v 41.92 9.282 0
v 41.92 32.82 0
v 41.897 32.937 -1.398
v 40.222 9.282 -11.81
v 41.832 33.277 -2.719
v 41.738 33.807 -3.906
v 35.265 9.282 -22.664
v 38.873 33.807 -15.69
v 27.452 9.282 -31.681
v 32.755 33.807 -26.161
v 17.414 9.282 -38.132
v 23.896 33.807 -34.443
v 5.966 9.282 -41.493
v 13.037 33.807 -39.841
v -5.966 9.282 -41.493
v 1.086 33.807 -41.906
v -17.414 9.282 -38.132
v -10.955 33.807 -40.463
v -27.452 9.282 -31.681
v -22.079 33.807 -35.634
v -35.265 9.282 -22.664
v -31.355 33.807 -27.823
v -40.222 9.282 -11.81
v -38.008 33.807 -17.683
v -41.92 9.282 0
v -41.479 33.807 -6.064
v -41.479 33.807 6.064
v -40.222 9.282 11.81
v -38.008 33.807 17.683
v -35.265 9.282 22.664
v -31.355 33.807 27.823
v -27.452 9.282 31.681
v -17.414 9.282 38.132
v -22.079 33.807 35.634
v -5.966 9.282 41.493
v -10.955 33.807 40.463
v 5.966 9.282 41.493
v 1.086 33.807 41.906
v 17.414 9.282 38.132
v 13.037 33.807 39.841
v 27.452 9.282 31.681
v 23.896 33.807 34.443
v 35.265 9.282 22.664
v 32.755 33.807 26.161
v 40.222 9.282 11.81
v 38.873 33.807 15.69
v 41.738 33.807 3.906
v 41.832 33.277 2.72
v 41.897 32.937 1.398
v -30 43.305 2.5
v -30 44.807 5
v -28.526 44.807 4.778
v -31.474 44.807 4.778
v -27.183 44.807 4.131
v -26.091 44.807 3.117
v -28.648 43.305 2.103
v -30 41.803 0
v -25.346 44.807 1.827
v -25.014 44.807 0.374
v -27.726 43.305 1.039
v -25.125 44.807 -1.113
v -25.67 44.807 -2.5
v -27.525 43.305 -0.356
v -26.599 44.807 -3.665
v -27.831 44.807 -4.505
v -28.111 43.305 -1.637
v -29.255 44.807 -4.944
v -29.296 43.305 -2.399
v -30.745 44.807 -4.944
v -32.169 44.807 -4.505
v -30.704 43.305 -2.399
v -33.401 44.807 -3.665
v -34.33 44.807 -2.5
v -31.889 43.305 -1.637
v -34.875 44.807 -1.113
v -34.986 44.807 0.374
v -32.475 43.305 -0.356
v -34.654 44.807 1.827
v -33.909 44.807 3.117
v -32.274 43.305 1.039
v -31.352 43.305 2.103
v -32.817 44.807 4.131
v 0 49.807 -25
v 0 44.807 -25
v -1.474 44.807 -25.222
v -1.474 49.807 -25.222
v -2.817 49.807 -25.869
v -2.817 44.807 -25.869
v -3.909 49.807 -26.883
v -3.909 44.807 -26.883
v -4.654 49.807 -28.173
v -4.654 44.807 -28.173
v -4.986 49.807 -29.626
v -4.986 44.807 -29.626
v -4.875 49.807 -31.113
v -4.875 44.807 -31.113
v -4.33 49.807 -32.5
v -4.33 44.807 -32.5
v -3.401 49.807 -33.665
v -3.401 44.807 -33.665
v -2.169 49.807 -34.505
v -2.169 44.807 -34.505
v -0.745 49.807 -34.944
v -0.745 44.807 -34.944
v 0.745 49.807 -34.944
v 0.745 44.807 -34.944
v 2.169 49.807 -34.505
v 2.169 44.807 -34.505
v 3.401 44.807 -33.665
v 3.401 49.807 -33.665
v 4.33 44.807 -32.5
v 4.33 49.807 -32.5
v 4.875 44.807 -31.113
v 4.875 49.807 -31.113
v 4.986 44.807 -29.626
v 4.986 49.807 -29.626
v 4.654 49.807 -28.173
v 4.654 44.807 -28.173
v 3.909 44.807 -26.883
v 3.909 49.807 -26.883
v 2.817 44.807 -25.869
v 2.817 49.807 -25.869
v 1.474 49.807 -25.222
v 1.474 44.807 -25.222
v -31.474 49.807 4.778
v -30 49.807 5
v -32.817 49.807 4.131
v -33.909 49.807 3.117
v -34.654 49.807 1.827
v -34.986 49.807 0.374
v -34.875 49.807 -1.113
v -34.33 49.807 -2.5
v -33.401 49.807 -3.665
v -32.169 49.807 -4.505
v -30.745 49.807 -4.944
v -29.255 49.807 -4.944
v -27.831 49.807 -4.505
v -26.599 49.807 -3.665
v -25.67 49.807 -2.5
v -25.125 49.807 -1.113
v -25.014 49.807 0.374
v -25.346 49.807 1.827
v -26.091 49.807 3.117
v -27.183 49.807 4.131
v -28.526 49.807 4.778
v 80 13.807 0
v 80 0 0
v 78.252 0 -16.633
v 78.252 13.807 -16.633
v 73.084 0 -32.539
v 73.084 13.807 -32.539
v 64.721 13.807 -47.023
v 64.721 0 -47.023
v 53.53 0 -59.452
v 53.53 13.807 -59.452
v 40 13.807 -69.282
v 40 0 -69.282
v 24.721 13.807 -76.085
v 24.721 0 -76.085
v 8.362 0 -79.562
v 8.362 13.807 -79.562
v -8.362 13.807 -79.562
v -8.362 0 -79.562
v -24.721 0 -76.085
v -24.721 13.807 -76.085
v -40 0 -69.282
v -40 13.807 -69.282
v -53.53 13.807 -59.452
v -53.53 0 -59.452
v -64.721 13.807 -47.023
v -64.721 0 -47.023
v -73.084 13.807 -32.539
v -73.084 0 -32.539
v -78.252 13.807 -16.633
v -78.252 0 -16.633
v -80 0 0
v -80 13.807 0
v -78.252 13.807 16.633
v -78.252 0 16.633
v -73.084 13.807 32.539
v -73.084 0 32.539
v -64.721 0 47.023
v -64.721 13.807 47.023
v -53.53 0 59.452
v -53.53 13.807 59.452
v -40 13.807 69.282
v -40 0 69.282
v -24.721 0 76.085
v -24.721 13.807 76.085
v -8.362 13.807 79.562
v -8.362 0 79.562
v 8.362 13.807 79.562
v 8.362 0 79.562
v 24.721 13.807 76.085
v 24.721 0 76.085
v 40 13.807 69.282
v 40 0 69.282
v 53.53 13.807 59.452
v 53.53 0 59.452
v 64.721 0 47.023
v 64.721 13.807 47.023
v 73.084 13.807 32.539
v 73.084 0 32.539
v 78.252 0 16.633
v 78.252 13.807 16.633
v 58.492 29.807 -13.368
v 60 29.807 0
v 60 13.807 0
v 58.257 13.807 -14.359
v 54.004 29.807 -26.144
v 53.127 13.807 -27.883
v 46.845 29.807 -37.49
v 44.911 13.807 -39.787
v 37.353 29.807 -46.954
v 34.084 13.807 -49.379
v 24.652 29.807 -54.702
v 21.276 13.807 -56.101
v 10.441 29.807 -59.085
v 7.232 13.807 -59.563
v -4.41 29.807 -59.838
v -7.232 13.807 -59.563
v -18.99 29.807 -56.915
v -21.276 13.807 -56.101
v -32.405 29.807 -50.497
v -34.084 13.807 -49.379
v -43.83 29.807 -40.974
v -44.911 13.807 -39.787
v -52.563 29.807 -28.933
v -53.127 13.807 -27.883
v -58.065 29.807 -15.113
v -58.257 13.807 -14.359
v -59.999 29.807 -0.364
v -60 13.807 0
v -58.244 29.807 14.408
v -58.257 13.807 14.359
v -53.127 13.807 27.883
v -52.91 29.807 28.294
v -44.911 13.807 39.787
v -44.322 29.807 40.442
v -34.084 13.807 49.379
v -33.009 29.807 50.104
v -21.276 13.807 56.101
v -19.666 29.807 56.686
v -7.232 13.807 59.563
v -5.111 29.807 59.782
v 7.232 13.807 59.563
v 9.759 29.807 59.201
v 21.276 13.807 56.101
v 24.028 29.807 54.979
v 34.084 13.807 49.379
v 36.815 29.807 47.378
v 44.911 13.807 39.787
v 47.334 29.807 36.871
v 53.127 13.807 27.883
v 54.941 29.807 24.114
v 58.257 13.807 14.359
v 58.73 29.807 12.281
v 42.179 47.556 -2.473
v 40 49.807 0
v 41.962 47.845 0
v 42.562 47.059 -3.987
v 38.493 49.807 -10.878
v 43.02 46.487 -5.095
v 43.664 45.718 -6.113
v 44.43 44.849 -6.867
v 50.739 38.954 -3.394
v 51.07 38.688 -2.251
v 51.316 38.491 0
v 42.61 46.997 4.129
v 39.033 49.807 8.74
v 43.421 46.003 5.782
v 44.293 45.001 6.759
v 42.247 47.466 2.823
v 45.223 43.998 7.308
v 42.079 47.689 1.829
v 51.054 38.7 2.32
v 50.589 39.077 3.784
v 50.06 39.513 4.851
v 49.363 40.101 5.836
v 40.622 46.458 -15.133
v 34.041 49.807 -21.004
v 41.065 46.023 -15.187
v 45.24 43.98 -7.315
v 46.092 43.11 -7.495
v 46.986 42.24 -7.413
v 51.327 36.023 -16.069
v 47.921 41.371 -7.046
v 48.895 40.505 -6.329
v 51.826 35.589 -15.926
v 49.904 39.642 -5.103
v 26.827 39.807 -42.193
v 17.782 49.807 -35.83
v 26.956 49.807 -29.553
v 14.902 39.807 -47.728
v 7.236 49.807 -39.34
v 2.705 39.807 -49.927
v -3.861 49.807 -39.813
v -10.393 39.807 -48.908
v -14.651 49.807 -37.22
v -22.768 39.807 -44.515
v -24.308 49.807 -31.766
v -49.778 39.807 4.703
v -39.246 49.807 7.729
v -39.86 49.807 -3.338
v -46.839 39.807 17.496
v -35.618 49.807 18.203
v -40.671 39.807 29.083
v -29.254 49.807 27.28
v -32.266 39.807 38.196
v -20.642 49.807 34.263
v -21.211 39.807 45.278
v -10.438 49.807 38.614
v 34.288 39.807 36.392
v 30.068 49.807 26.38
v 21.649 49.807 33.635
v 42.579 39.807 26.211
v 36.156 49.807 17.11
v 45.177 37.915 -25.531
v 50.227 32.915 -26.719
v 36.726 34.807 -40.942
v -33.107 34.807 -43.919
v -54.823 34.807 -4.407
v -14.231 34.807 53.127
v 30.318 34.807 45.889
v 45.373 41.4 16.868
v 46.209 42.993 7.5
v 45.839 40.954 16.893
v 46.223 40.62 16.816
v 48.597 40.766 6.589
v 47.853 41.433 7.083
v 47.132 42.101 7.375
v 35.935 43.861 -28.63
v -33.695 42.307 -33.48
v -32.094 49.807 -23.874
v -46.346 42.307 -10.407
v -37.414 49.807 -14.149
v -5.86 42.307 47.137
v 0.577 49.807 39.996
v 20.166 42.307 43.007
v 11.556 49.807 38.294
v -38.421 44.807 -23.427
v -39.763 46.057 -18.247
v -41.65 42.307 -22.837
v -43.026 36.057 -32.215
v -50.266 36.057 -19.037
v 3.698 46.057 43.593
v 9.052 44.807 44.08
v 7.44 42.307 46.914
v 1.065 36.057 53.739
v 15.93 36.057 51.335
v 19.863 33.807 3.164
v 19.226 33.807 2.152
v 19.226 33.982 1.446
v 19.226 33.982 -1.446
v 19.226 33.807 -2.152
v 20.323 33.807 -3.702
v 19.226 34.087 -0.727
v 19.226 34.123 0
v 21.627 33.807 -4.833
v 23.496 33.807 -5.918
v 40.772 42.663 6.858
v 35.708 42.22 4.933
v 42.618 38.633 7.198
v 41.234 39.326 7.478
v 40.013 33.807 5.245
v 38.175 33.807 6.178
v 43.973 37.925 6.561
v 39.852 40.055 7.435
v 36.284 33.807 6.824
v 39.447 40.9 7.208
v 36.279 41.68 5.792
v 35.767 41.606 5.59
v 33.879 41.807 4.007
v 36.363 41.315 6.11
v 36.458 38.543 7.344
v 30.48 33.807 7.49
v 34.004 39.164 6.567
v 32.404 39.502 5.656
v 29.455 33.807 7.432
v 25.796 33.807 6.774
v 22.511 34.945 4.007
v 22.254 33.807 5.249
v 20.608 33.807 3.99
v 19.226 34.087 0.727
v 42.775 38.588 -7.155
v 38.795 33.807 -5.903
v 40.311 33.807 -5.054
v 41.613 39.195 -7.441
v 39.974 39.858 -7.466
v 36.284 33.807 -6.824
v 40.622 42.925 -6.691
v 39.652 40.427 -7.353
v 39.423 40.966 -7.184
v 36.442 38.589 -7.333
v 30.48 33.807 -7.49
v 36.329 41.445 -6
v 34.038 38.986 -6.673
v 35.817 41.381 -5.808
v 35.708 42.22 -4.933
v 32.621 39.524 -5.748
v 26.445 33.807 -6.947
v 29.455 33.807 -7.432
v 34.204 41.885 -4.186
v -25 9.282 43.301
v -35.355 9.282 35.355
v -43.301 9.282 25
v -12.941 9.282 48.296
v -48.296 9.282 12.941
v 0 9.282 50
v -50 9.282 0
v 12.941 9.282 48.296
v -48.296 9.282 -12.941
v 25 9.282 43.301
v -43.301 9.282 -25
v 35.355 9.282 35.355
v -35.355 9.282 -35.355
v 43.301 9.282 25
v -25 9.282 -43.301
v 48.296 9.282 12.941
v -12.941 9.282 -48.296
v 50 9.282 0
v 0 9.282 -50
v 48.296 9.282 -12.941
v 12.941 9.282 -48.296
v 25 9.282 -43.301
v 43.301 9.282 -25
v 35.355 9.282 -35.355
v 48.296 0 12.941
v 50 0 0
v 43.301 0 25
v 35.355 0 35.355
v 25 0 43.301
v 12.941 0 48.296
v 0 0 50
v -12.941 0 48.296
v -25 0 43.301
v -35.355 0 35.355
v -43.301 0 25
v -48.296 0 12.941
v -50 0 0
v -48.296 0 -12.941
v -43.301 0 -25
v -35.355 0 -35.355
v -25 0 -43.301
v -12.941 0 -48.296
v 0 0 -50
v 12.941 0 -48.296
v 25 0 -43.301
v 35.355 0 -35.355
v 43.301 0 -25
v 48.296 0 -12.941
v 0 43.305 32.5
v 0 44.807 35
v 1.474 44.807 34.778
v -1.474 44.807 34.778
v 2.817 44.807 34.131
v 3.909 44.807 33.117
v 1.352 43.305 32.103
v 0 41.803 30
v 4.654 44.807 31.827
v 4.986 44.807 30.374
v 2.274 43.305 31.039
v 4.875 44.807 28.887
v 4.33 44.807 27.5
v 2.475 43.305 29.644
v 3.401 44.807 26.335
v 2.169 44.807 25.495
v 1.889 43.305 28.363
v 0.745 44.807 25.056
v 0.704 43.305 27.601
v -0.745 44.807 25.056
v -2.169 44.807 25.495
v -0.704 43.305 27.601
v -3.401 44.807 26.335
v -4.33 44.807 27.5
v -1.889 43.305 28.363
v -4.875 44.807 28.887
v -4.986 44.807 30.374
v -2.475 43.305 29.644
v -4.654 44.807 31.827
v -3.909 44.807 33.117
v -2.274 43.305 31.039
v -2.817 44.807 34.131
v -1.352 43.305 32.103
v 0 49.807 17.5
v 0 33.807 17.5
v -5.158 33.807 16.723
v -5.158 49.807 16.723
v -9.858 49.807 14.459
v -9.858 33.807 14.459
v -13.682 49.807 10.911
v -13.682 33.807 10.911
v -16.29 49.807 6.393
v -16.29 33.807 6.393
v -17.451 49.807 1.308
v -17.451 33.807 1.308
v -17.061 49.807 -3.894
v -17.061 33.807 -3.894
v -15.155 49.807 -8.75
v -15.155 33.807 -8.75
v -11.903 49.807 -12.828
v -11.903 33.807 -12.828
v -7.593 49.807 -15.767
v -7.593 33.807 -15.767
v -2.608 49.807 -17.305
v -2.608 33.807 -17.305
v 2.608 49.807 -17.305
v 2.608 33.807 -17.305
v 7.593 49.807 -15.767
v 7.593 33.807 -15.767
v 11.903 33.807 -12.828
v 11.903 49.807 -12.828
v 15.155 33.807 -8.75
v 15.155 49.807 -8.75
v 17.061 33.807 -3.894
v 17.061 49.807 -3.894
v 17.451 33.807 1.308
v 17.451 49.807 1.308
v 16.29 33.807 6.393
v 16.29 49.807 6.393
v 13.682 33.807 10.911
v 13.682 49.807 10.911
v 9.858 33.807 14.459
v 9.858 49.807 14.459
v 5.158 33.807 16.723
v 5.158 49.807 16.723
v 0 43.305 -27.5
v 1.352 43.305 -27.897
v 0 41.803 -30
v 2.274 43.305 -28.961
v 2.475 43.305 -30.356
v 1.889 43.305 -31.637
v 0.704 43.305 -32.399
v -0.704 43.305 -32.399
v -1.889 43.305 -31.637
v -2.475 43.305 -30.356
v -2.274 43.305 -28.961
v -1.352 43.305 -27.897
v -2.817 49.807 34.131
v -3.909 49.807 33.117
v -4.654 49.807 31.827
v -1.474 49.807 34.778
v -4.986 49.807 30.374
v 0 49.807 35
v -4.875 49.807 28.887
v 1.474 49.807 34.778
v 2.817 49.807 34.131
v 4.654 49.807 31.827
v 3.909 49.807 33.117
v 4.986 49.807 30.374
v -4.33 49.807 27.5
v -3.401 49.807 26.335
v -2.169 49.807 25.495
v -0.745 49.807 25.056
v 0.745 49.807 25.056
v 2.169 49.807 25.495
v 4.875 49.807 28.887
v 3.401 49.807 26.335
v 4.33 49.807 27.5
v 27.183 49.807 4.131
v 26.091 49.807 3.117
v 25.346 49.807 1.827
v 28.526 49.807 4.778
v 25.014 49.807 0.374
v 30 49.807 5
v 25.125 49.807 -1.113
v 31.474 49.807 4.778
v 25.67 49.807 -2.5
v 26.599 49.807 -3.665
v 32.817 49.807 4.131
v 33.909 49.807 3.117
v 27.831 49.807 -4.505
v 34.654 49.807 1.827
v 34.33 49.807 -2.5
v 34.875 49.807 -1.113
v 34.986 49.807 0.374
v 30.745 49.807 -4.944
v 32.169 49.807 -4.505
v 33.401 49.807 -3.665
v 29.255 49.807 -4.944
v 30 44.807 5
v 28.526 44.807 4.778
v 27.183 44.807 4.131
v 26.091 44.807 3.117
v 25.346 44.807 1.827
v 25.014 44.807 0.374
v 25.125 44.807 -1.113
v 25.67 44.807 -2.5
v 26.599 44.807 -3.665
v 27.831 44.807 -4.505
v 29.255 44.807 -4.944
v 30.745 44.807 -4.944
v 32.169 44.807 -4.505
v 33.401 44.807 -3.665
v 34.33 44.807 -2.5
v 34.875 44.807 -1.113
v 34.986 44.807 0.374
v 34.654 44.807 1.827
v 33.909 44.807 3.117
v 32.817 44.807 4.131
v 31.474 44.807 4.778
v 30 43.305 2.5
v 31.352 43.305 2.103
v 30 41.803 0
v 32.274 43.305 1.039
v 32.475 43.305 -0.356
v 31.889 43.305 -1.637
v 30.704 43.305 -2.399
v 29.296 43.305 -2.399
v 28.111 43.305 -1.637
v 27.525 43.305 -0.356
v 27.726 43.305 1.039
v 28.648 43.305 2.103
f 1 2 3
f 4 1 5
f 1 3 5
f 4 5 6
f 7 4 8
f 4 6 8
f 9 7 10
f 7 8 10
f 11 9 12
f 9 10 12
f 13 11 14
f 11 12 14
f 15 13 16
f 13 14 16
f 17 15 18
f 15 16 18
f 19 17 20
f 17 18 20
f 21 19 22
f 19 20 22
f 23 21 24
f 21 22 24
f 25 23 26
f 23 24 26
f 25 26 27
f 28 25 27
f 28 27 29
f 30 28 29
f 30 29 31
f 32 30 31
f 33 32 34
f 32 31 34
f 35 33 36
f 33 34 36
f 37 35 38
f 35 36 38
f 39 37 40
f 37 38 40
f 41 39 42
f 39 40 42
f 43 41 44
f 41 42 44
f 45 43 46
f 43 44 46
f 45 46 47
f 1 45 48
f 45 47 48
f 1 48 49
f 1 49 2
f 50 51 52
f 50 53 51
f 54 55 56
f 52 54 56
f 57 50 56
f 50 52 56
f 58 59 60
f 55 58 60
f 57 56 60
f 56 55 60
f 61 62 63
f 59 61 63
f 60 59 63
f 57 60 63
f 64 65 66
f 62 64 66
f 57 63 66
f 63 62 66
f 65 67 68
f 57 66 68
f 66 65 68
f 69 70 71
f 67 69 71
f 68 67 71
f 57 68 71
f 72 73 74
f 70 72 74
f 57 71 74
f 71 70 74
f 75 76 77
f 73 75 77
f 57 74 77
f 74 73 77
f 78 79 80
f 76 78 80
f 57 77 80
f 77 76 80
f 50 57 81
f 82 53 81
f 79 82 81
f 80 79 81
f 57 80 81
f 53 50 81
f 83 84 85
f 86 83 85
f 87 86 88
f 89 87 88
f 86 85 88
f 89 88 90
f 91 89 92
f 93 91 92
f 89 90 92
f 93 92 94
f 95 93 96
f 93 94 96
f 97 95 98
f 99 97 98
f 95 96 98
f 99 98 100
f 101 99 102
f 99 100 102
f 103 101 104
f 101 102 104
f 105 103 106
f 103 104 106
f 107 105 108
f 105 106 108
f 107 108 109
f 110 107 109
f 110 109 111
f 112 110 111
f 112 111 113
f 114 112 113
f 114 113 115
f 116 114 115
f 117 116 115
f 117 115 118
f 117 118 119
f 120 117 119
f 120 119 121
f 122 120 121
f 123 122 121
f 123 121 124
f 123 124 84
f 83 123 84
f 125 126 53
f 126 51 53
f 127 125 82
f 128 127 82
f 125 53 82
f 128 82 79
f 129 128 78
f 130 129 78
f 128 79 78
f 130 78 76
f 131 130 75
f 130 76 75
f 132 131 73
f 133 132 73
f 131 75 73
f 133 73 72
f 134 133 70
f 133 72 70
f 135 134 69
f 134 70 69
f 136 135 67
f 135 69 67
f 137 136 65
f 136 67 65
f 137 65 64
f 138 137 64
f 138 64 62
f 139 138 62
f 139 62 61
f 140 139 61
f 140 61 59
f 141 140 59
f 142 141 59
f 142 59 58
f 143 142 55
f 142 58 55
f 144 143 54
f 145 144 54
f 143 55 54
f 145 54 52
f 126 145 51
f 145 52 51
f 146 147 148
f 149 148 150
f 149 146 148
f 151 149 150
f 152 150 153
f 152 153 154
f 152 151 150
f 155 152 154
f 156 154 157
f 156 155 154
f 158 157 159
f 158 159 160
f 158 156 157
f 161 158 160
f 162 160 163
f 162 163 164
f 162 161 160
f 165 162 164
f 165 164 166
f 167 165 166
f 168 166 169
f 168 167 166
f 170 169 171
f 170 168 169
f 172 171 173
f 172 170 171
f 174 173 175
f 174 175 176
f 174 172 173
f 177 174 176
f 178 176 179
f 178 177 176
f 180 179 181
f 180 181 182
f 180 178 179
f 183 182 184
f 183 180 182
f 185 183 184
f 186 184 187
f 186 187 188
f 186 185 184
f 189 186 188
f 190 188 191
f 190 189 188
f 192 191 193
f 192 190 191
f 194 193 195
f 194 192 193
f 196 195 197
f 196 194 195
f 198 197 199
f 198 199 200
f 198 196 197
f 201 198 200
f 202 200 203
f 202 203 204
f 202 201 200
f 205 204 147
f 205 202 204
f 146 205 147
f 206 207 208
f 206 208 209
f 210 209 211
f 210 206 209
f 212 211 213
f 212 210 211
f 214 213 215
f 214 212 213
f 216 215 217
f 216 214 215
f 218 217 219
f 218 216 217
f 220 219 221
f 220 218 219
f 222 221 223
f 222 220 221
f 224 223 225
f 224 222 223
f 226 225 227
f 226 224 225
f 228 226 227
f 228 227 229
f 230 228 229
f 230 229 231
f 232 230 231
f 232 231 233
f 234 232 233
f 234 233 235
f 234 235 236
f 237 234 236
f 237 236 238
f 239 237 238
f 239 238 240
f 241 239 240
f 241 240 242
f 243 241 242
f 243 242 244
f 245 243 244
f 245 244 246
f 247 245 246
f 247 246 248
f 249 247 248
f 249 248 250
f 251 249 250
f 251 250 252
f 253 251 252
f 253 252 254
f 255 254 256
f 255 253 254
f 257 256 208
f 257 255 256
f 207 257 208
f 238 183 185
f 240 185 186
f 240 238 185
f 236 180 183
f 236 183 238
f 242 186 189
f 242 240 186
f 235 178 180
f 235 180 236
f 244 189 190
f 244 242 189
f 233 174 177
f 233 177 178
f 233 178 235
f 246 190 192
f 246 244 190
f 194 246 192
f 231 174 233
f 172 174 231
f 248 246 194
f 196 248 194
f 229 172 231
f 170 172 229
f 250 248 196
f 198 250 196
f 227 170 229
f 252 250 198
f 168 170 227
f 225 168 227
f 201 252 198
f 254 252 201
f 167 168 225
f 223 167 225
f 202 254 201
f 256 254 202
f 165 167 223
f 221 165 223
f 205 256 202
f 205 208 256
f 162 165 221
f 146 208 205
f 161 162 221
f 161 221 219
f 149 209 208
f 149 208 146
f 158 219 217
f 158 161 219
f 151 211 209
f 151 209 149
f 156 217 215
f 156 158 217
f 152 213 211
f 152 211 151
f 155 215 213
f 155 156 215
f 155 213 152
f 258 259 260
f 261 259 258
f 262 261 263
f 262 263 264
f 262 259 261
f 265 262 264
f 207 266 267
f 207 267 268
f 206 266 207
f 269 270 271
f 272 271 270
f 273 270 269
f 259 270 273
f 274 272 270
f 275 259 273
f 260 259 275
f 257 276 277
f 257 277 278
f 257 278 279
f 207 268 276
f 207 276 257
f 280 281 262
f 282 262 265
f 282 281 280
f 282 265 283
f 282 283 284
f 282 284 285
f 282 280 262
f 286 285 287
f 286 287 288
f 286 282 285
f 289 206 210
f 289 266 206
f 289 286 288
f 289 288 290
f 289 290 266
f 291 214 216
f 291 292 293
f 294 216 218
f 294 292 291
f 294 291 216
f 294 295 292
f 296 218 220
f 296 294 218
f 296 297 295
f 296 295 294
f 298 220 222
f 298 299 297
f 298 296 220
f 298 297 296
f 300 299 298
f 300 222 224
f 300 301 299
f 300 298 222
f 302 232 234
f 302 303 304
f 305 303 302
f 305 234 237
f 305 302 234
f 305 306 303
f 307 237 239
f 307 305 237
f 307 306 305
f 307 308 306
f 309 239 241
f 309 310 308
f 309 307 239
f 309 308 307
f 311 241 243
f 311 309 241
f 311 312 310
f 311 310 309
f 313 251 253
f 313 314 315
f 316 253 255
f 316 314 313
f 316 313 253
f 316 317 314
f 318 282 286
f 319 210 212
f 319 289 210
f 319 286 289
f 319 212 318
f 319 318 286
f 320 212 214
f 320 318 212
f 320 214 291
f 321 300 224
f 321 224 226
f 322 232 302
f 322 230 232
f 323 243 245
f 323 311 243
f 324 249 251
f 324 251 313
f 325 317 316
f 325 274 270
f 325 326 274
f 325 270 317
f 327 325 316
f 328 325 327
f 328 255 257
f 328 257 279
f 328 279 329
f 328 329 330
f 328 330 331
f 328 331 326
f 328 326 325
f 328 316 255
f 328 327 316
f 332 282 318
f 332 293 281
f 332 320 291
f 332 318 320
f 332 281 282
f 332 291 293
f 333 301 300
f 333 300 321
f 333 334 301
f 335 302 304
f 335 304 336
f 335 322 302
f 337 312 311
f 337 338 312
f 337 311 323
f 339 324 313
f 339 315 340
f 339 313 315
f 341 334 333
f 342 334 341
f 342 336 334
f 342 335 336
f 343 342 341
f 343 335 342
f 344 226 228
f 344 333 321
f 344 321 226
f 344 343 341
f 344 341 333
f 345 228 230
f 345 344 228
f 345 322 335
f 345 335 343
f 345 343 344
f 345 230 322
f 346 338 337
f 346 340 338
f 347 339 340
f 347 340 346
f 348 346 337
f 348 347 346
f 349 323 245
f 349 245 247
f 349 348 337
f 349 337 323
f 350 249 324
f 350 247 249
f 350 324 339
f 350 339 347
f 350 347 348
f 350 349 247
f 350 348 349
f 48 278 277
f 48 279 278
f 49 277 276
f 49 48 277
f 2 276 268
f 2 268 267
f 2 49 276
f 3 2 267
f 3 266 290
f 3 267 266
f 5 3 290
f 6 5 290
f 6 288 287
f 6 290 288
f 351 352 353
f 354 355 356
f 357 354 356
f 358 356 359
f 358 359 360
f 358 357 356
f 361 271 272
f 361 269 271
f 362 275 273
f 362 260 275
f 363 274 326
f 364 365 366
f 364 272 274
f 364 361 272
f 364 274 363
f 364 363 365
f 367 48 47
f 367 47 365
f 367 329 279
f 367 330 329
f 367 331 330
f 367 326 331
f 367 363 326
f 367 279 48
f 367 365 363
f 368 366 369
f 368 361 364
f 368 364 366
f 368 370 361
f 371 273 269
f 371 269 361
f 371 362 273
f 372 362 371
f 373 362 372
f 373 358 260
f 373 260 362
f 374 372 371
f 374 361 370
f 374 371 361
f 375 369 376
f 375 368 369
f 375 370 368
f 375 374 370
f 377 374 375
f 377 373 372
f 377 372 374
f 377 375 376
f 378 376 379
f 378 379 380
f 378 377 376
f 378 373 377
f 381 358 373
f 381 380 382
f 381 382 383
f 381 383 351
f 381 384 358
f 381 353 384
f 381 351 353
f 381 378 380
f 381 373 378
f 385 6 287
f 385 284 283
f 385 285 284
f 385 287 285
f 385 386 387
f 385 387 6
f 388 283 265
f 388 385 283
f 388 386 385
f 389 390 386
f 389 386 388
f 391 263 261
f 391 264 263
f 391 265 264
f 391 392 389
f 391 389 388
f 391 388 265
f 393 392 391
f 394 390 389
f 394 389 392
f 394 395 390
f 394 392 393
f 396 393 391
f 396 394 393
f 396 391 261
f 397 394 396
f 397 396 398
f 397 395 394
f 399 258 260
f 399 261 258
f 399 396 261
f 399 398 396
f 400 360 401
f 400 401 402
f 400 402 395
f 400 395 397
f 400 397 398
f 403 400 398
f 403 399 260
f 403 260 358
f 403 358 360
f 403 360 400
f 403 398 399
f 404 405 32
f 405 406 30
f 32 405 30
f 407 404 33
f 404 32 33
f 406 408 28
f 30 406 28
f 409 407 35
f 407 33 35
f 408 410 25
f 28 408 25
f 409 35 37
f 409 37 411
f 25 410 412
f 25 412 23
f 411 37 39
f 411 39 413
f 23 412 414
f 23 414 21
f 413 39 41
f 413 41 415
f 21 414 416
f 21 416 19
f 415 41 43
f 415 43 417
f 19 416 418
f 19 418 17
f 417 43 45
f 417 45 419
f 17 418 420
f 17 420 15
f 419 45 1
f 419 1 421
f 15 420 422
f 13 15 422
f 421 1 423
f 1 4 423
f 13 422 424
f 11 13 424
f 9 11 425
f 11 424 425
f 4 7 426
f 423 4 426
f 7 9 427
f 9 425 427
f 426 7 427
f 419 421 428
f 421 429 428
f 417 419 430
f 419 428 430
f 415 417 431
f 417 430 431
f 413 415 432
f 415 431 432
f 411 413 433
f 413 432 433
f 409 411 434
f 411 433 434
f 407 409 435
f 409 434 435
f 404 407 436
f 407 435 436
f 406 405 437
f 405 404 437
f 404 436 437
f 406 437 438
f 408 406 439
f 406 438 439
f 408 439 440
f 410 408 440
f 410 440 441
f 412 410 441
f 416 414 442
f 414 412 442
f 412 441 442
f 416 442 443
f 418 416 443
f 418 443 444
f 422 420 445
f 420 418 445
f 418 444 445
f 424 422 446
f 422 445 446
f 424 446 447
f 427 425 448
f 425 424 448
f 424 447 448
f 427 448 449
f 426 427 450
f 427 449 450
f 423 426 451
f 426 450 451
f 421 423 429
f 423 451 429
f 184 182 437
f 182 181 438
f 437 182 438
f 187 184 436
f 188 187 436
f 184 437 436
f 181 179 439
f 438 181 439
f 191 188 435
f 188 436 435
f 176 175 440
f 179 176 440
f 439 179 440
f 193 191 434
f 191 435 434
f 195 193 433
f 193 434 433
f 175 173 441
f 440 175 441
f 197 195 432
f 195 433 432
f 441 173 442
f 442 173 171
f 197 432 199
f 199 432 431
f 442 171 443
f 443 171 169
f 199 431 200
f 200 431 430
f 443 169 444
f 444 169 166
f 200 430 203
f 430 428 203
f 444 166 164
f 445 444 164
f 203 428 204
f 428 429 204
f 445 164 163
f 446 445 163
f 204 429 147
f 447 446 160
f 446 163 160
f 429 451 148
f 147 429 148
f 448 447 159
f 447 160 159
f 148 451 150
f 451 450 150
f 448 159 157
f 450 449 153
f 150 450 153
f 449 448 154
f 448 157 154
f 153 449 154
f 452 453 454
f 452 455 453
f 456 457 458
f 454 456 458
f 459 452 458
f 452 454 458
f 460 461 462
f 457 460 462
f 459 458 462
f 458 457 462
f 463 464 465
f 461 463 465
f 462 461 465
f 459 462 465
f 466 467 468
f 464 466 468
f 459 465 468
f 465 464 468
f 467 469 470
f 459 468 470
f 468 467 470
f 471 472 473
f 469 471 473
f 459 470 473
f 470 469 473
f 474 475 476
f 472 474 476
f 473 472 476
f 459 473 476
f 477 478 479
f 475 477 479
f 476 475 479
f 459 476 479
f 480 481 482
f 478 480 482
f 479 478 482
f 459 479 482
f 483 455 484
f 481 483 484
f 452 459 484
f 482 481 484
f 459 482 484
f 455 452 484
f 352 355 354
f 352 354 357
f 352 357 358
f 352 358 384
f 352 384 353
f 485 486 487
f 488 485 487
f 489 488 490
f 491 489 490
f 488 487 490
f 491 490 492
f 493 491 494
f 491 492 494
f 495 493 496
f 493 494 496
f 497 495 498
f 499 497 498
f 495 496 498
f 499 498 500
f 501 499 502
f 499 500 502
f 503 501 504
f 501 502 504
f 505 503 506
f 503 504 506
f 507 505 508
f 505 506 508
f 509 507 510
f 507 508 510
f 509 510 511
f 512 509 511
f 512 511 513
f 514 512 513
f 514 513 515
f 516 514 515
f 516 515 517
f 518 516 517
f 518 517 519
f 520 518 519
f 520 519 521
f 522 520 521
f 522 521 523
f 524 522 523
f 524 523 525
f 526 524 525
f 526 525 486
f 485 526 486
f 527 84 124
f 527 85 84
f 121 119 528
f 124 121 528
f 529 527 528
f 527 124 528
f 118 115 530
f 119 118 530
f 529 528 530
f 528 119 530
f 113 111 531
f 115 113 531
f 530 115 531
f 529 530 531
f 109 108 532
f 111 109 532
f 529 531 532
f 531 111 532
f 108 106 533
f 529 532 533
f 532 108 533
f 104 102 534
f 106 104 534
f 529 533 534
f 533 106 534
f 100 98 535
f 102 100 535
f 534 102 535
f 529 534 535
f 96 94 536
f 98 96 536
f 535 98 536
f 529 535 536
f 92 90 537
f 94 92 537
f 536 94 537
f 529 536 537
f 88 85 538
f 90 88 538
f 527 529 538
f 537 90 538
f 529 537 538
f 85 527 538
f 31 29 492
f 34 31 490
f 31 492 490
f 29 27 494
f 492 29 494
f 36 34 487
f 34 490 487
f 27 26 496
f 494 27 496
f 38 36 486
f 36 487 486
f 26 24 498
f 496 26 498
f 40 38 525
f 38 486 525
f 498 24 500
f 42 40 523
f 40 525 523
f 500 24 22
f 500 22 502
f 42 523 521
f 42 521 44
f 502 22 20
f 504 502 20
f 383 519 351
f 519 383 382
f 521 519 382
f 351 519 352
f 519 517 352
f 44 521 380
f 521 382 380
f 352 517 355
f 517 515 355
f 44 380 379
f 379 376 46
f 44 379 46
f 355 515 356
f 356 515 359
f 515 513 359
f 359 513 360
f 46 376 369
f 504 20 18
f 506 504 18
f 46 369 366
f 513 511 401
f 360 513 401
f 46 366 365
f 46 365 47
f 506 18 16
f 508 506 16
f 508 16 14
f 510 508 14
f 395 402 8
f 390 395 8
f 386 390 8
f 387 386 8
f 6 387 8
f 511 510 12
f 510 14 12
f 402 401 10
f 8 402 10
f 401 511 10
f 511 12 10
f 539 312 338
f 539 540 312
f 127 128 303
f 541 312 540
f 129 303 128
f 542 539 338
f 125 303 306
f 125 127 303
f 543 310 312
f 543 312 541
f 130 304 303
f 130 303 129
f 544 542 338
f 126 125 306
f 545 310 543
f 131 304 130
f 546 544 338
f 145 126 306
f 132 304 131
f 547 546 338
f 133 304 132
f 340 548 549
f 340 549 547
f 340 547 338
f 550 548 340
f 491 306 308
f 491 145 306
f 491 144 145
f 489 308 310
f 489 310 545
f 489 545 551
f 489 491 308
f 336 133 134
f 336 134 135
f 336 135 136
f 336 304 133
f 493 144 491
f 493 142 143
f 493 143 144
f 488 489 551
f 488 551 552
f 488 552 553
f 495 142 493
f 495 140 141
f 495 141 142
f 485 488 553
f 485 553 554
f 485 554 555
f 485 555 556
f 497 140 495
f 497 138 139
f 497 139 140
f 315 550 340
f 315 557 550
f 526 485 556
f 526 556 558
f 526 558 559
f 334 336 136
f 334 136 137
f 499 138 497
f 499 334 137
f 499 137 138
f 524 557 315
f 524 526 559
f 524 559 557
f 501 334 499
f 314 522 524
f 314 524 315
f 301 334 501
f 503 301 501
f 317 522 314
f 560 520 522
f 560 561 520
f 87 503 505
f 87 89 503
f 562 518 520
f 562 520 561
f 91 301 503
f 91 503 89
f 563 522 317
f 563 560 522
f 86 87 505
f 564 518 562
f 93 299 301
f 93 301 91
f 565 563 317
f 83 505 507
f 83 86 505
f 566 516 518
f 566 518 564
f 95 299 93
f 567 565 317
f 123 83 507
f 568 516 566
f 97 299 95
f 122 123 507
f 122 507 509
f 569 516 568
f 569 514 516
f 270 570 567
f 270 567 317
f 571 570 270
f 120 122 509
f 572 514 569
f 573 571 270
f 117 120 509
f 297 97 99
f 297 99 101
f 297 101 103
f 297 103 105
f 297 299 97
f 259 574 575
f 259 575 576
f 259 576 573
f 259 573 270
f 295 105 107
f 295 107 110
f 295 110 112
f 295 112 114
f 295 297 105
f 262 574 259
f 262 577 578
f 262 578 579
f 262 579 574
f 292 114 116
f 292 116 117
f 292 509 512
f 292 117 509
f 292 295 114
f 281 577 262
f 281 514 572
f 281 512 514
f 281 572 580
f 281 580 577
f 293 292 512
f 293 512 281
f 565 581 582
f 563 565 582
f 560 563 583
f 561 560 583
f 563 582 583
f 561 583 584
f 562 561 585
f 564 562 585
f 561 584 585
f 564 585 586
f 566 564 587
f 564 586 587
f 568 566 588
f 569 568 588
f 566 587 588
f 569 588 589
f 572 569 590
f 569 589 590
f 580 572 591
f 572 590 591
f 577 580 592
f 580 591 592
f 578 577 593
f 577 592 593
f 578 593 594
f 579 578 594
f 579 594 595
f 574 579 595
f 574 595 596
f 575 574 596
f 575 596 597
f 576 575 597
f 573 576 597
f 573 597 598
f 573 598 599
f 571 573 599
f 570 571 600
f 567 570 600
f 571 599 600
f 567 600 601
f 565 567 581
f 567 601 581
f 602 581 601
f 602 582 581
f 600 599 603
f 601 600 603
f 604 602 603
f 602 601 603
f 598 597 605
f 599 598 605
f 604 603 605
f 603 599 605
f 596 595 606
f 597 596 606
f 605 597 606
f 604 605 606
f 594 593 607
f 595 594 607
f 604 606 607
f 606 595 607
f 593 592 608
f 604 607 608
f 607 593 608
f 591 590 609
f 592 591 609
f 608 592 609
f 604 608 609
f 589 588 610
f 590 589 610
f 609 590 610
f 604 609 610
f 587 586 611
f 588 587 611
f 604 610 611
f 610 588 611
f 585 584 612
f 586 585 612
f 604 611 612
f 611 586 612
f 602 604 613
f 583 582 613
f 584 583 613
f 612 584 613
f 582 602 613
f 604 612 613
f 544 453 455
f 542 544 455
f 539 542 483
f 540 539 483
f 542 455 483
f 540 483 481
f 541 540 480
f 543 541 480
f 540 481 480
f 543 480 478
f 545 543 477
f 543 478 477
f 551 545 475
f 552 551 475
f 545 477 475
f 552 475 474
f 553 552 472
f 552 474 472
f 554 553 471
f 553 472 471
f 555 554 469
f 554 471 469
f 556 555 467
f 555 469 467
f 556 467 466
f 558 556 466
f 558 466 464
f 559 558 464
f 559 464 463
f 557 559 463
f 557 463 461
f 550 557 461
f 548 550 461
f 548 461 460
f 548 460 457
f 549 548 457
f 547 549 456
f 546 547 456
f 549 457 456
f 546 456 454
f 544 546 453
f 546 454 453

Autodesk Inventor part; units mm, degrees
ref_plane "XZ Plane" through (0, 0, 0) normal (0, 1, 0) x (-1, 0, 0)
ref_plane "XY Plane" through (0, 0, 0) normal (0, 0, 1) x (1, 0, 0)
sketch "Sketch1" plane through (0, 0, 0) normal (0, 0, 1) x (1, 0, 0)
  line L0 (0, 0) -> (0, 66)
  line L1 (80, 0) -> (80, 13.8071)
  line L2 (-21.5975, 0) -> (0, 0)
  line L3 (46.9201, 0) -> (53.1744, 0)
  line L4 (80, 13.8071) -> (60, 13.8071)
  line L5 (60, 13.8071) -> (60, 33.8071)
  line L6 (36.9201, 33.8071) -> (30.3778, 33.8071)
  line L7 (0, 33.8071) -> (31.3863, 33.8071)
  line L8 (0, 33.8071) -> (0, 49.8071)
  line L9 (0, 49.8071) -> (35, 49.8071)
  line L10 (46.9201, 9.2823) -> (41.9201, 9.2823)
  line L11 (41.9201, 9.2823) -> (41.9201, 33.8071)
  line L12 (41.9201, 33.8071) -> (36.9201, 33.8071)
  line L13 (60, 33.8071) -> (60, 49.8071)
  line L14 (60, 49.8071) -> (35, 49.8071)
  line L15 (46.9201, 9.2823) -> (50, 9.2823)
  line L16 (50, 9.2823) -> (50, 0)
  line L17 (50, 0) -> (80, 0)
  dimension "d0" = 66
  dimension "d2" = 160
  dimension "d4" = 20
  dimension "d5" = 20
  dimension "d15" = 35
  dimension "d16" = 70
  dimension "d84" = 100
revolve "Revolution1" add sketch "Sketch1" angle 360 about axis through (0, 0, 0) along (0, 1, 0)
chamfer "Chamfer1" distance 20 angle 45 1 edges at (-60, 49.8071, 0)
ref_plane "Work Plane1" through (60, 0, 0) normal (1, 0, 0) x (0, 1, 0)
sketch "Sketch8" plane through (60, 0, 0) normal (1, 0, 0) x (0, 1, 0)
  circle A0 centre (51.2317, 0) radius 7.5
  point P0 (0, 0)
  dimension "d51" = 15
sketch "Sketch9" plane through (0, 0, 0) normal (0, 0, 1) x (1, 0, 0)
  line L0 (60.0797, 51.2451) -> (19.226, 26.5879)
  point P0 (0, 0)
sweep "Sweep2" cut profiles "Sketch8" path "Sketch9"
sketch "Sketch10" plane through (0, 49.8071, 0) normal (0, 1, 0) x (1, 0, 0)
  circle A0 centre (0, 0) radius 16
  dimension "d54" = 32
hole "Hole2" at (0, 49.8071, 0) direction (0, -1, 0) diameter 35 end through all
sketch "Sketch11" plane through (0, 49.8071, 0) normal (0, 1, 0) x (1, 0, 0)
  circle A0 centre (0, 0) radius 40
  circle A1 centre (0, -30) radius 5
  circle A2 centre (30, 0) radius 5
  circle A3 centre (0, 30) radius 5
  circle A4 centre (-30, 0) radius 5
  dimension "d64" = 80
  dimension "d65" = 10
  dimension "d66" = 30
  dimension "d67" = 360
hole "Hole3" at (0, 49.8071, -30) at (30, 49.8071, 0) at (0, 49.8071, 30) at (-30, 49.8071, 0) direction (0, -1, 0) diameter 10 depth 5 tip angle 118
thread "Thread5"
thread "Thread6"
thread "Thread7"
thread "Thread8"
equation "\"d60\" = Thickness"
equation "\"BendRadius\" = Thickness"
equation "\"BendReliefWidth\" = Thickness"
equation "\"BendReliefDepth\" = 0.5 * Thickness"
equation "\"CornerReliefSize\" = 4 * Thickness"
equation "\"MinimumRemnant\" = 2 * Thickness"
equation "\"TransitionRadius\" = BendRadius"
equation "\"JacobiRadiusSize\" = BendRadius"
equation "\"GapSize\" = Thickness"
equation "\"Thickness\" = 0.5"
properties material "Stainless Steel"
